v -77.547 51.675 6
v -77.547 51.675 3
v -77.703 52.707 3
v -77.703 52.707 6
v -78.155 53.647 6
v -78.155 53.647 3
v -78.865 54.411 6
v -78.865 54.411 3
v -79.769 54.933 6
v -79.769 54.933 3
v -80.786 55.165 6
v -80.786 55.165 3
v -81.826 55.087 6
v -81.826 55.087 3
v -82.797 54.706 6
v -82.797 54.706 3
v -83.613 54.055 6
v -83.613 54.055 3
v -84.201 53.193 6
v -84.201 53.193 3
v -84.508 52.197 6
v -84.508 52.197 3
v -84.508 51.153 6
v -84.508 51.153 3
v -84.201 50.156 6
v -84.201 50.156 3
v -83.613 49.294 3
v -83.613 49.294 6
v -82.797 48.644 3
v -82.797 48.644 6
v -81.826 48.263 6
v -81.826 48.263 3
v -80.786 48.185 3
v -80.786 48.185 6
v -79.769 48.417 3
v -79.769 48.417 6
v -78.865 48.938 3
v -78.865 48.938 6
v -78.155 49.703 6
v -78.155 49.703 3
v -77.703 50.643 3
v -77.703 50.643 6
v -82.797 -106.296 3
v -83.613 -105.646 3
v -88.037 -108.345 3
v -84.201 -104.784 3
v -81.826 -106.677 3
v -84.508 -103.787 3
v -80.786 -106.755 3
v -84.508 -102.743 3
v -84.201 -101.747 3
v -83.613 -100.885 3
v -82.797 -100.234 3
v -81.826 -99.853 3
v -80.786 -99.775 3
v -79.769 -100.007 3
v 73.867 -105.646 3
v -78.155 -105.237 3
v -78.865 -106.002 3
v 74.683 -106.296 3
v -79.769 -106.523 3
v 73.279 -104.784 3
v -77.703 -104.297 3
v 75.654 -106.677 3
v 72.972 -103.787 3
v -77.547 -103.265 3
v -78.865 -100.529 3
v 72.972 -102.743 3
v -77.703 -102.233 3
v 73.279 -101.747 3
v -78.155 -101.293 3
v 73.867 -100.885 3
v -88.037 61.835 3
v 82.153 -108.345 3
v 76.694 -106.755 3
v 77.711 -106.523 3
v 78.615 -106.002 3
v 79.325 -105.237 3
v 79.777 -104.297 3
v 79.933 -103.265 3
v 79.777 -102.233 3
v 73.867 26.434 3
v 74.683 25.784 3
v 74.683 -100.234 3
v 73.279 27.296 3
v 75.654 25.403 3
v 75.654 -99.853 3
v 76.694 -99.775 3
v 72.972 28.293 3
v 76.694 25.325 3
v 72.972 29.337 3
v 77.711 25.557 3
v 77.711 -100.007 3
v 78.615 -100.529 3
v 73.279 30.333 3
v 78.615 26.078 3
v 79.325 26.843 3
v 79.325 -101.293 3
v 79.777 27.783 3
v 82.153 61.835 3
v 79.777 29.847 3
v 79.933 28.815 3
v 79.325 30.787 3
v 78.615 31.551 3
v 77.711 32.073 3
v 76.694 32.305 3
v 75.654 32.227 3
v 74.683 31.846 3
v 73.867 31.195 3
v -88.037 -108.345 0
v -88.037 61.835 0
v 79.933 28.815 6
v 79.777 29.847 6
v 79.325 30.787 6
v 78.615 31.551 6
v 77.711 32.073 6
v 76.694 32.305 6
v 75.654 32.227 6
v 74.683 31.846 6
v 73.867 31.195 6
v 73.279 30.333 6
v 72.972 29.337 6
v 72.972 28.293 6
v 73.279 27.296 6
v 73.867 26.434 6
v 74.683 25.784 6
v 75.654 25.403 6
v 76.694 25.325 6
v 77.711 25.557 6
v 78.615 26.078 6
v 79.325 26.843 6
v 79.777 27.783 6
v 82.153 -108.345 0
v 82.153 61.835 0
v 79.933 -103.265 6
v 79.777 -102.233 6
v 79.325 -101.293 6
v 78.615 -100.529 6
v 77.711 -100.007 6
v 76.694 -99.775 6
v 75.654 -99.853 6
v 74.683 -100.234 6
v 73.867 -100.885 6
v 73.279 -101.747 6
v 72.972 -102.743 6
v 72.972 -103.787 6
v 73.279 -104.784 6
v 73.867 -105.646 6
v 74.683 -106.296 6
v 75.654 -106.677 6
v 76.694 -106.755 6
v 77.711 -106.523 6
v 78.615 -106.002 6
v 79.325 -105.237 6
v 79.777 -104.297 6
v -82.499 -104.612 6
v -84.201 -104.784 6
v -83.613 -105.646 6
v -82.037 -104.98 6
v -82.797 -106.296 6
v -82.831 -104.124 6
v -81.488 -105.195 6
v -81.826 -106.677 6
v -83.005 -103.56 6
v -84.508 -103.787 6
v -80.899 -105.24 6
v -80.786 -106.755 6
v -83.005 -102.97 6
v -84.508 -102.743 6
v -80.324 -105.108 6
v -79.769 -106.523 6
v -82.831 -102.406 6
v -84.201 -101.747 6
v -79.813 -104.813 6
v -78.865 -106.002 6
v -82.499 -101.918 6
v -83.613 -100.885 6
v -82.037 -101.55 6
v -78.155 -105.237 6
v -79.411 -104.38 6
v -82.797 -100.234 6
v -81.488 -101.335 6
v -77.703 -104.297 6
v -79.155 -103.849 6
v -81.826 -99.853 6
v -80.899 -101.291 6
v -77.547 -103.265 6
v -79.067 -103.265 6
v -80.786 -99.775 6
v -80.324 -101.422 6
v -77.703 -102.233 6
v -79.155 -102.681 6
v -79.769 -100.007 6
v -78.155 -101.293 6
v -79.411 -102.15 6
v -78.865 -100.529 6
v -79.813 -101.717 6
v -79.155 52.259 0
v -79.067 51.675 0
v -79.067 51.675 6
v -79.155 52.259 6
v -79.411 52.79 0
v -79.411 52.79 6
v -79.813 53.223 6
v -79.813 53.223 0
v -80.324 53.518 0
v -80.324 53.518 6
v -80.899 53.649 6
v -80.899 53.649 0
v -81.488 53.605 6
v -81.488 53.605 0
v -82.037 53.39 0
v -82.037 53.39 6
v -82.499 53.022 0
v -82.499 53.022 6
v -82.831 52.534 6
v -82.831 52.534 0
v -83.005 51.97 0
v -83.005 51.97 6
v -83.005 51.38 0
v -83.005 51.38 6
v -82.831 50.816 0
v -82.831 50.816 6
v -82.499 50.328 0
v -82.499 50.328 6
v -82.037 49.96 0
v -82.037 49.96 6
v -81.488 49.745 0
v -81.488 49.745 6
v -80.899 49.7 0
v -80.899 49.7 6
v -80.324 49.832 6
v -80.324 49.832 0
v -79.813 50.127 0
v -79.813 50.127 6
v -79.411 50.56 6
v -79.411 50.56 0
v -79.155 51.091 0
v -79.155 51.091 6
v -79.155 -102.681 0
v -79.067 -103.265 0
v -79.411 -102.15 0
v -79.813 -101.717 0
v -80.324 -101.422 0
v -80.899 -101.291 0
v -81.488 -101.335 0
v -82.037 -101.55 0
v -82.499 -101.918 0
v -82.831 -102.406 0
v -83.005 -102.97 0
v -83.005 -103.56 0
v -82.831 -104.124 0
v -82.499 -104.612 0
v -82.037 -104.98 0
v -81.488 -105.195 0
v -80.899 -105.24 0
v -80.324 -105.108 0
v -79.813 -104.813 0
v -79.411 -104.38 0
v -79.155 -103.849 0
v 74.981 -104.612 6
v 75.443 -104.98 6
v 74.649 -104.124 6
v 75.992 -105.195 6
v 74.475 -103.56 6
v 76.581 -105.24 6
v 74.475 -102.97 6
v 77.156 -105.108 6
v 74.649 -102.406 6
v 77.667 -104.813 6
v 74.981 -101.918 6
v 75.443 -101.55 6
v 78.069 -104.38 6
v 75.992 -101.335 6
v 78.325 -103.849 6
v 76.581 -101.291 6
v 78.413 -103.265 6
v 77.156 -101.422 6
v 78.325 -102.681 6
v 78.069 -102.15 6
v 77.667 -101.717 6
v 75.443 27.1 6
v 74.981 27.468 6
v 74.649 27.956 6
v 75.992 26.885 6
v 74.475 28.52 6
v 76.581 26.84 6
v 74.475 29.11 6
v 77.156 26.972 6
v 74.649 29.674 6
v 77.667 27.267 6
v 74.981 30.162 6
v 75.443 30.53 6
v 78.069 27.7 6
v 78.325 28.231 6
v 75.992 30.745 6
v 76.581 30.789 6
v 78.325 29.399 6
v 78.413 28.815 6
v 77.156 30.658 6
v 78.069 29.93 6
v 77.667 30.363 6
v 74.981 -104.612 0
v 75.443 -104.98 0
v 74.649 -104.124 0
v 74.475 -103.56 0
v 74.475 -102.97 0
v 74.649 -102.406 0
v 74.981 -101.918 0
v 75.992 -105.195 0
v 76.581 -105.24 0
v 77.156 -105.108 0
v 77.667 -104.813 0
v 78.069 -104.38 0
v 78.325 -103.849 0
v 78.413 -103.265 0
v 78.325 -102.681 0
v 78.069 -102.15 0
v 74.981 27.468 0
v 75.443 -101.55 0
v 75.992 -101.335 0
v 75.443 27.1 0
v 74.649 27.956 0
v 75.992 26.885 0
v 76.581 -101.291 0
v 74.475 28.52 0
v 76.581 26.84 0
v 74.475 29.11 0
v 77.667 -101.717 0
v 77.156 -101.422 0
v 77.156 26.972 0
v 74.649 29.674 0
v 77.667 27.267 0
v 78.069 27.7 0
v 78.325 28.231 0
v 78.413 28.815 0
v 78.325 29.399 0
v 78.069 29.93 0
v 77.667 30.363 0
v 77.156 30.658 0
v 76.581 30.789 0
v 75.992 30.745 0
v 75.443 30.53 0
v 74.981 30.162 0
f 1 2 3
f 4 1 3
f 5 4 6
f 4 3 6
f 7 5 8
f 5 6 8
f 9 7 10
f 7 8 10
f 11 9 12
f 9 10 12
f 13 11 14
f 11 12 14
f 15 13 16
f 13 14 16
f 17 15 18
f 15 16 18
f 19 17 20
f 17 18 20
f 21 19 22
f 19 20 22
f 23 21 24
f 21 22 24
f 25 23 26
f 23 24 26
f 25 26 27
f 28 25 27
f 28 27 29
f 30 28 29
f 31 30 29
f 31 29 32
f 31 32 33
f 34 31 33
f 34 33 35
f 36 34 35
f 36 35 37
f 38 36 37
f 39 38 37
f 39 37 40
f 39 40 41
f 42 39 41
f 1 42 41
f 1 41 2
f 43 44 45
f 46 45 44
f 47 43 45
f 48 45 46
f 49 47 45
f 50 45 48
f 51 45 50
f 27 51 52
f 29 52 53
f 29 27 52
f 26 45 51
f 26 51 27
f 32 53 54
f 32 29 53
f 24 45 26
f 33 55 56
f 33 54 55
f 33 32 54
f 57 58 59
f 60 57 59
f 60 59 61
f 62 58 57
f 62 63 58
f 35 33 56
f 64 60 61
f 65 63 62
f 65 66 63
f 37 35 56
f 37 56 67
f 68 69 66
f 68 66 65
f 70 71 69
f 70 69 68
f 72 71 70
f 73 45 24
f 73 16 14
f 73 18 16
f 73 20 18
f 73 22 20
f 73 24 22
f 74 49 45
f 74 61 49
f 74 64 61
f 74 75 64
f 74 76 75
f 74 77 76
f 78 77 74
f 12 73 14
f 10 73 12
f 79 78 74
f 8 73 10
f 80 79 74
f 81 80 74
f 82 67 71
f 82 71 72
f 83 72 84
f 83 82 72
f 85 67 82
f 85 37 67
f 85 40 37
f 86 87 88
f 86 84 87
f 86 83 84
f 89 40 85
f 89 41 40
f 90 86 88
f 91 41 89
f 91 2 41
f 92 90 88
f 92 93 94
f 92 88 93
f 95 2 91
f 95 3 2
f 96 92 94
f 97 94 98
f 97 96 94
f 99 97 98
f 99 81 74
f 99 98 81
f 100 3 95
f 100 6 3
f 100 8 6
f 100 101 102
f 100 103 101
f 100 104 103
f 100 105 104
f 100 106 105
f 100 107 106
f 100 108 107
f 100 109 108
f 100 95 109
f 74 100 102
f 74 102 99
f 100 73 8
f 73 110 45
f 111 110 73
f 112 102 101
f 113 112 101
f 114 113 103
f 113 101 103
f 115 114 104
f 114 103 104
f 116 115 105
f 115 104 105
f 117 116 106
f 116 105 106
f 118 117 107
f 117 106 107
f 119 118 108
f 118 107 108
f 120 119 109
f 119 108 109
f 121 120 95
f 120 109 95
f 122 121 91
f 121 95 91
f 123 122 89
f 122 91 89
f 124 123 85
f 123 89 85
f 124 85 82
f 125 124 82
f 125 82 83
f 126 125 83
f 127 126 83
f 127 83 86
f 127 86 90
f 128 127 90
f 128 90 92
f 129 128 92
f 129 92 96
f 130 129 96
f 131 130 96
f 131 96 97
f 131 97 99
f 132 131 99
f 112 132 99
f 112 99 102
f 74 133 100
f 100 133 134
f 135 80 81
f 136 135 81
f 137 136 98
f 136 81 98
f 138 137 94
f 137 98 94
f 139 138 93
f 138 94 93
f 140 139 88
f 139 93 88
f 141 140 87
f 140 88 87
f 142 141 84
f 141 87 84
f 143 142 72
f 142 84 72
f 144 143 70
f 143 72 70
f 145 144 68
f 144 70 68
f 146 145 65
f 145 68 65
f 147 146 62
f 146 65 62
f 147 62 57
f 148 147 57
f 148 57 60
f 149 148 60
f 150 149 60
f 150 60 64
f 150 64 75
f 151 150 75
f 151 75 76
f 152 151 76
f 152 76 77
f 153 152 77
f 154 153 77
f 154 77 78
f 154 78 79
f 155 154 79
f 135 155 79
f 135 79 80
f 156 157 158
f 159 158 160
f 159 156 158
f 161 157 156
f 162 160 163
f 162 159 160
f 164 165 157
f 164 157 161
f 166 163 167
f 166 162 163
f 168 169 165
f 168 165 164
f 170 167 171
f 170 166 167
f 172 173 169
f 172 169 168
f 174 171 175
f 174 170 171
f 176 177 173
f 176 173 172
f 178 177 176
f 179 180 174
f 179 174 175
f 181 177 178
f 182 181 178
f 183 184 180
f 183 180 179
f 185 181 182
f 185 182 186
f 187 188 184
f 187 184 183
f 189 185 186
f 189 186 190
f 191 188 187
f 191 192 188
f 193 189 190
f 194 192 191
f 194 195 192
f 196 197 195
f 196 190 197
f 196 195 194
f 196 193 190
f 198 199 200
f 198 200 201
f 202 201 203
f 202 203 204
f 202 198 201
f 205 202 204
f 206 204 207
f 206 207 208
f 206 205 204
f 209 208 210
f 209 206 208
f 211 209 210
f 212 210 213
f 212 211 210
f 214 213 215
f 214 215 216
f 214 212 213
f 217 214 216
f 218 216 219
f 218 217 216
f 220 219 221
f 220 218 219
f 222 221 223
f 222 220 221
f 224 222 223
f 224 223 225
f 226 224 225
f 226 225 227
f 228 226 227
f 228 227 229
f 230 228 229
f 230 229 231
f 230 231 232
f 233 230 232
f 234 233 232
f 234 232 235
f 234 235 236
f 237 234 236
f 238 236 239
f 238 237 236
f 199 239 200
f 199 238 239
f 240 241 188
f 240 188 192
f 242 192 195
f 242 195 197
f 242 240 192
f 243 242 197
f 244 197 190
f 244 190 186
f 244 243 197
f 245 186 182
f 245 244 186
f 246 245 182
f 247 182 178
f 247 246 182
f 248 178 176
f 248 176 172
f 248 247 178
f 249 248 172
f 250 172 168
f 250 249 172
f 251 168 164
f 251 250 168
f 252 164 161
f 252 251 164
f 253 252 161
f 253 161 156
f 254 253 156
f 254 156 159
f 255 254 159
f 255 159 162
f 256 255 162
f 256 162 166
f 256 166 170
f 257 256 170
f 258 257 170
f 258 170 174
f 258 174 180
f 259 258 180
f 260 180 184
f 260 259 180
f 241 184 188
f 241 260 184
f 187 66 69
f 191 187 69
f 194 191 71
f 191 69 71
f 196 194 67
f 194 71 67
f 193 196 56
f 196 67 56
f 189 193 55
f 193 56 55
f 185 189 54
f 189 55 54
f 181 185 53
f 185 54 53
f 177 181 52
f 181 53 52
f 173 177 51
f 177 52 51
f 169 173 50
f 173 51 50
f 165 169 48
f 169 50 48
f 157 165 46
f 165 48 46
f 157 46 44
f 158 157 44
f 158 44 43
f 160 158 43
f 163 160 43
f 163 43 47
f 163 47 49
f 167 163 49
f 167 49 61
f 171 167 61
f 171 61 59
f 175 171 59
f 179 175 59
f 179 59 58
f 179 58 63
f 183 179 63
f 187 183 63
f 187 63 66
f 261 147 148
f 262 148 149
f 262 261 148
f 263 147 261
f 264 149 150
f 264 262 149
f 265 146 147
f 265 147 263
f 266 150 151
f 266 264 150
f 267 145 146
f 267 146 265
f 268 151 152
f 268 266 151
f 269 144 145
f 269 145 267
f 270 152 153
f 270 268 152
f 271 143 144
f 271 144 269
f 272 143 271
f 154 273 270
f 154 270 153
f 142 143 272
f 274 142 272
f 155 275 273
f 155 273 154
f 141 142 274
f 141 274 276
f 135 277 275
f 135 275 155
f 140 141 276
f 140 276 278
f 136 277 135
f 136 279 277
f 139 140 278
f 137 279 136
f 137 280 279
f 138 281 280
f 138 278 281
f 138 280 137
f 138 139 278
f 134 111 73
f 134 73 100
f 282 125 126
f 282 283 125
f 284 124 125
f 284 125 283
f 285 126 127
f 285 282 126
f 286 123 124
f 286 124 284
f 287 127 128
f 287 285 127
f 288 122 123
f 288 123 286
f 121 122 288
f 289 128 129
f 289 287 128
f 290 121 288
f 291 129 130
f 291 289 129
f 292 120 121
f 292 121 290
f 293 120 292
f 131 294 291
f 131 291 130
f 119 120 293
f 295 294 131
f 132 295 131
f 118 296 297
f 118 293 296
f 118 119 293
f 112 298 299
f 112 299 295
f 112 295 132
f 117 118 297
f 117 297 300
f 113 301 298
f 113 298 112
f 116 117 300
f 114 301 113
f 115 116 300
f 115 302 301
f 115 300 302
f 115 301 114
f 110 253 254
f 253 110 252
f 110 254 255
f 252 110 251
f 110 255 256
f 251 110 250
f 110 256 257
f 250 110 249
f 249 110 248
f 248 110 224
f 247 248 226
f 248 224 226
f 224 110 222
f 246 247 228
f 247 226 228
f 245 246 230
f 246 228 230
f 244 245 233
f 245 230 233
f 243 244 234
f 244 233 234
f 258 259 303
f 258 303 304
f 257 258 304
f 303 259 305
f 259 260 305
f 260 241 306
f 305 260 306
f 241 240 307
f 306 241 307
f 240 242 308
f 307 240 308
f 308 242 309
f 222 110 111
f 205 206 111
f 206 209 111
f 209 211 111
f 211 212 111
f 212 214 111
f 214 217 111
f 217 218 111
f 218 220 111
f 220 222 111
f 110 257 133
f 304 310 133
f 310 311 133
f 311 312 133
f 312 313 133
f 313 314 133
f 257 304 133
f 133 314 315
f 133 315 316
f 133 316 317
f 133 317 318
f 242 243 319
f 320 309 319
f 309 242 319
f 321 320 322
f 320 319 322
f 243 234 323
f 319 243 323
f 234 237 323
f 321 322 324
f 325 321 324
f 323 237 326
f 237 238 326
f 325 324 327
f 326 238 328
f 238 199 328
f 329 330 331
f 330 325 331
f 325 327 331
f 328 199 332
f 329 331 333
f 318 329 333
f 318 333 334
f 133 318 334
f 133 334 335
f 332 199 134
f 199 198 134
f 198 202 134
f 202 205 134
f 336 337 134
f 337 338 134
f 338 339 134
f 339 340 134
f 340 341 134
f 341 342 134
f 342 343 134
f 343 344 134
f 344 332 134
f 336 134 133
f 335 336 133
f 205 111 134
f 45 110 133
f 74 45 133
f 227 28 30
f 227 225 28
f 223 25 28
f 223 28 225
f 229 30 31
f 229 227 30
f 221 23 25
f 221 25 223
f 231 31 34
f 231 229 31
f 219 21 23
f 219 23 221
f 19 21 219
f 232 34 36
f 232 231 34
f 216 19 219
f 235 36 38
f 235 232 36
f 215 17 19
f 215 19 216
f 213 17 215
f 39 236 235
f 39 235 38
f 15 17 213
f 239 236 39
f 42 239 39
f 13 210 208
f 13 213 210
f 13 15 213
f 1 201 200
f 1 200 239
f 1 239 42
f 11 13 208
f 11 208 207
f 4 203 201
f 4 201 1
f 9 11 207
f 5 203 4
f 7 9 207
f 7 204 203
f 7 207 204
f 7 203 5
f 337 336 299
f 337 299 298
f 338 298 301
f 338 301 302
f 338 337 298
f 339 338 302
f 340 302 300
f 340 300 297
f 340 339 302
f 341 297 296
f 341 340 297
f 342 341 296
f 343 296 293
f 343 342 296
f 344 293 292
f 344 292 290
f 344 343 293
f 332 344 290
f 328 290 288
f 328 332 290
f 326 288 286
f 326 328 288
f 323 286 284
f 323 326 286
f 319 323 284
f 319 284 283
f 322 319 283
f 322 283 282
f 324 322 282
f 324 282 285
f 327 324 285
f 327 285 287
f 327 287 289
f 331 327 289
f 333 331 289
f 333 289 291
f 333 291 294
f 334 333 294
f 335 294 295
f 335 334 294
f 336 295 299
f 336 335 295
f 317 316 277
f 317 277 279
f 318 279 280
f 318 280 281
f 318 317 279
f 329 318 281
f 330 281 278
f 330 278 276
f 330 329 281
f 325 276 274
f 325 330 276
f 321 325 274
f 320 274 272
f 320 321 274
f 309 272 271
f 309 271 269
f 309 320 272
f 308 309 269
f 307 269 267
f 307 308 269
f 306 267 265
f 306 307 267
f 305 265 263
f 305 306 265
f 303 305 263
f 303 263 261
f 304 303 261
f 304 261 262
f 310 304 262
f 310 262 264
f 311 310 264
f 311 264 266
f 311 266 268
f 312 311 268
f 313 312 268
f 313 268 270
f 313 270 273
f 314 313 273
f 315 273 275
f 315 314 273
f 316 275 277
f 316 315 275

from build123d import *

# Parameters (mm, degrees)
F0_W     = 170.19
F0_H     = 170.18
F0_R     = 3.5
F1_DEPTH = 3
F0_R_2   = 1.98
F2_DEPTH = 6


with BuildPart() as f1:
    # F0 (on Top) → F1 (new body)
    with BuildSketch(Plane.XY):
        with Locations((-2.9422, -23.25511)):
            Rectangle(F0_W, F0_H)
        with Locations((-81.0472, -103.26511)):
            Circle(F0_R, mode=Mode.SUBTRACT)
        with Locations((76.4328, -103.26511)):
            Circle(F0_R, mode=Mode.SUBTRACT)
        with Locations((-81.0472, 51.67489)):
            Circle(F0_R, mode=Mode.SUBTRACT)
        with Locations((76.4328, 28.81489)):
            Circle(F0_R, mode=Mode.SUBTRACT)
    extrude(amount=F1_DEPTH)

    # F0 (on Top) → F2 (join)
    with BuildSketch(Plane.XY):
        with Locations((76.4328, -103.26511)):
            Circle(F0_R)
        with Locations((76.4328, -103.26511)):
            Circle(F0_R_2, mode=Mode.SUBTRACT)
        with Locations((-81.0472, -103.26511)):
            Circle(F0_R)
        with Locations((-81.0472, -103.26511)):
            Circle(F0_R_2, mode=Mode.SUBTRACT)
        with Locations((-81.0472, 51.67489)):
            Circle(F0_R)
        with Locations((-81.0472, 51.67489)):
            Circle(F0_R_2, mode=Mode.SUBTRACT)
        with Locations((76.4328, 28.81489)):
            Circle(F0_R)
        with Locations((76.4328, 28.81489)):
            Circle(F0_R_2, mode=Mode.SUBTRACT)
    extrude(amount=F2_DEPTH)


solid = f1.part
